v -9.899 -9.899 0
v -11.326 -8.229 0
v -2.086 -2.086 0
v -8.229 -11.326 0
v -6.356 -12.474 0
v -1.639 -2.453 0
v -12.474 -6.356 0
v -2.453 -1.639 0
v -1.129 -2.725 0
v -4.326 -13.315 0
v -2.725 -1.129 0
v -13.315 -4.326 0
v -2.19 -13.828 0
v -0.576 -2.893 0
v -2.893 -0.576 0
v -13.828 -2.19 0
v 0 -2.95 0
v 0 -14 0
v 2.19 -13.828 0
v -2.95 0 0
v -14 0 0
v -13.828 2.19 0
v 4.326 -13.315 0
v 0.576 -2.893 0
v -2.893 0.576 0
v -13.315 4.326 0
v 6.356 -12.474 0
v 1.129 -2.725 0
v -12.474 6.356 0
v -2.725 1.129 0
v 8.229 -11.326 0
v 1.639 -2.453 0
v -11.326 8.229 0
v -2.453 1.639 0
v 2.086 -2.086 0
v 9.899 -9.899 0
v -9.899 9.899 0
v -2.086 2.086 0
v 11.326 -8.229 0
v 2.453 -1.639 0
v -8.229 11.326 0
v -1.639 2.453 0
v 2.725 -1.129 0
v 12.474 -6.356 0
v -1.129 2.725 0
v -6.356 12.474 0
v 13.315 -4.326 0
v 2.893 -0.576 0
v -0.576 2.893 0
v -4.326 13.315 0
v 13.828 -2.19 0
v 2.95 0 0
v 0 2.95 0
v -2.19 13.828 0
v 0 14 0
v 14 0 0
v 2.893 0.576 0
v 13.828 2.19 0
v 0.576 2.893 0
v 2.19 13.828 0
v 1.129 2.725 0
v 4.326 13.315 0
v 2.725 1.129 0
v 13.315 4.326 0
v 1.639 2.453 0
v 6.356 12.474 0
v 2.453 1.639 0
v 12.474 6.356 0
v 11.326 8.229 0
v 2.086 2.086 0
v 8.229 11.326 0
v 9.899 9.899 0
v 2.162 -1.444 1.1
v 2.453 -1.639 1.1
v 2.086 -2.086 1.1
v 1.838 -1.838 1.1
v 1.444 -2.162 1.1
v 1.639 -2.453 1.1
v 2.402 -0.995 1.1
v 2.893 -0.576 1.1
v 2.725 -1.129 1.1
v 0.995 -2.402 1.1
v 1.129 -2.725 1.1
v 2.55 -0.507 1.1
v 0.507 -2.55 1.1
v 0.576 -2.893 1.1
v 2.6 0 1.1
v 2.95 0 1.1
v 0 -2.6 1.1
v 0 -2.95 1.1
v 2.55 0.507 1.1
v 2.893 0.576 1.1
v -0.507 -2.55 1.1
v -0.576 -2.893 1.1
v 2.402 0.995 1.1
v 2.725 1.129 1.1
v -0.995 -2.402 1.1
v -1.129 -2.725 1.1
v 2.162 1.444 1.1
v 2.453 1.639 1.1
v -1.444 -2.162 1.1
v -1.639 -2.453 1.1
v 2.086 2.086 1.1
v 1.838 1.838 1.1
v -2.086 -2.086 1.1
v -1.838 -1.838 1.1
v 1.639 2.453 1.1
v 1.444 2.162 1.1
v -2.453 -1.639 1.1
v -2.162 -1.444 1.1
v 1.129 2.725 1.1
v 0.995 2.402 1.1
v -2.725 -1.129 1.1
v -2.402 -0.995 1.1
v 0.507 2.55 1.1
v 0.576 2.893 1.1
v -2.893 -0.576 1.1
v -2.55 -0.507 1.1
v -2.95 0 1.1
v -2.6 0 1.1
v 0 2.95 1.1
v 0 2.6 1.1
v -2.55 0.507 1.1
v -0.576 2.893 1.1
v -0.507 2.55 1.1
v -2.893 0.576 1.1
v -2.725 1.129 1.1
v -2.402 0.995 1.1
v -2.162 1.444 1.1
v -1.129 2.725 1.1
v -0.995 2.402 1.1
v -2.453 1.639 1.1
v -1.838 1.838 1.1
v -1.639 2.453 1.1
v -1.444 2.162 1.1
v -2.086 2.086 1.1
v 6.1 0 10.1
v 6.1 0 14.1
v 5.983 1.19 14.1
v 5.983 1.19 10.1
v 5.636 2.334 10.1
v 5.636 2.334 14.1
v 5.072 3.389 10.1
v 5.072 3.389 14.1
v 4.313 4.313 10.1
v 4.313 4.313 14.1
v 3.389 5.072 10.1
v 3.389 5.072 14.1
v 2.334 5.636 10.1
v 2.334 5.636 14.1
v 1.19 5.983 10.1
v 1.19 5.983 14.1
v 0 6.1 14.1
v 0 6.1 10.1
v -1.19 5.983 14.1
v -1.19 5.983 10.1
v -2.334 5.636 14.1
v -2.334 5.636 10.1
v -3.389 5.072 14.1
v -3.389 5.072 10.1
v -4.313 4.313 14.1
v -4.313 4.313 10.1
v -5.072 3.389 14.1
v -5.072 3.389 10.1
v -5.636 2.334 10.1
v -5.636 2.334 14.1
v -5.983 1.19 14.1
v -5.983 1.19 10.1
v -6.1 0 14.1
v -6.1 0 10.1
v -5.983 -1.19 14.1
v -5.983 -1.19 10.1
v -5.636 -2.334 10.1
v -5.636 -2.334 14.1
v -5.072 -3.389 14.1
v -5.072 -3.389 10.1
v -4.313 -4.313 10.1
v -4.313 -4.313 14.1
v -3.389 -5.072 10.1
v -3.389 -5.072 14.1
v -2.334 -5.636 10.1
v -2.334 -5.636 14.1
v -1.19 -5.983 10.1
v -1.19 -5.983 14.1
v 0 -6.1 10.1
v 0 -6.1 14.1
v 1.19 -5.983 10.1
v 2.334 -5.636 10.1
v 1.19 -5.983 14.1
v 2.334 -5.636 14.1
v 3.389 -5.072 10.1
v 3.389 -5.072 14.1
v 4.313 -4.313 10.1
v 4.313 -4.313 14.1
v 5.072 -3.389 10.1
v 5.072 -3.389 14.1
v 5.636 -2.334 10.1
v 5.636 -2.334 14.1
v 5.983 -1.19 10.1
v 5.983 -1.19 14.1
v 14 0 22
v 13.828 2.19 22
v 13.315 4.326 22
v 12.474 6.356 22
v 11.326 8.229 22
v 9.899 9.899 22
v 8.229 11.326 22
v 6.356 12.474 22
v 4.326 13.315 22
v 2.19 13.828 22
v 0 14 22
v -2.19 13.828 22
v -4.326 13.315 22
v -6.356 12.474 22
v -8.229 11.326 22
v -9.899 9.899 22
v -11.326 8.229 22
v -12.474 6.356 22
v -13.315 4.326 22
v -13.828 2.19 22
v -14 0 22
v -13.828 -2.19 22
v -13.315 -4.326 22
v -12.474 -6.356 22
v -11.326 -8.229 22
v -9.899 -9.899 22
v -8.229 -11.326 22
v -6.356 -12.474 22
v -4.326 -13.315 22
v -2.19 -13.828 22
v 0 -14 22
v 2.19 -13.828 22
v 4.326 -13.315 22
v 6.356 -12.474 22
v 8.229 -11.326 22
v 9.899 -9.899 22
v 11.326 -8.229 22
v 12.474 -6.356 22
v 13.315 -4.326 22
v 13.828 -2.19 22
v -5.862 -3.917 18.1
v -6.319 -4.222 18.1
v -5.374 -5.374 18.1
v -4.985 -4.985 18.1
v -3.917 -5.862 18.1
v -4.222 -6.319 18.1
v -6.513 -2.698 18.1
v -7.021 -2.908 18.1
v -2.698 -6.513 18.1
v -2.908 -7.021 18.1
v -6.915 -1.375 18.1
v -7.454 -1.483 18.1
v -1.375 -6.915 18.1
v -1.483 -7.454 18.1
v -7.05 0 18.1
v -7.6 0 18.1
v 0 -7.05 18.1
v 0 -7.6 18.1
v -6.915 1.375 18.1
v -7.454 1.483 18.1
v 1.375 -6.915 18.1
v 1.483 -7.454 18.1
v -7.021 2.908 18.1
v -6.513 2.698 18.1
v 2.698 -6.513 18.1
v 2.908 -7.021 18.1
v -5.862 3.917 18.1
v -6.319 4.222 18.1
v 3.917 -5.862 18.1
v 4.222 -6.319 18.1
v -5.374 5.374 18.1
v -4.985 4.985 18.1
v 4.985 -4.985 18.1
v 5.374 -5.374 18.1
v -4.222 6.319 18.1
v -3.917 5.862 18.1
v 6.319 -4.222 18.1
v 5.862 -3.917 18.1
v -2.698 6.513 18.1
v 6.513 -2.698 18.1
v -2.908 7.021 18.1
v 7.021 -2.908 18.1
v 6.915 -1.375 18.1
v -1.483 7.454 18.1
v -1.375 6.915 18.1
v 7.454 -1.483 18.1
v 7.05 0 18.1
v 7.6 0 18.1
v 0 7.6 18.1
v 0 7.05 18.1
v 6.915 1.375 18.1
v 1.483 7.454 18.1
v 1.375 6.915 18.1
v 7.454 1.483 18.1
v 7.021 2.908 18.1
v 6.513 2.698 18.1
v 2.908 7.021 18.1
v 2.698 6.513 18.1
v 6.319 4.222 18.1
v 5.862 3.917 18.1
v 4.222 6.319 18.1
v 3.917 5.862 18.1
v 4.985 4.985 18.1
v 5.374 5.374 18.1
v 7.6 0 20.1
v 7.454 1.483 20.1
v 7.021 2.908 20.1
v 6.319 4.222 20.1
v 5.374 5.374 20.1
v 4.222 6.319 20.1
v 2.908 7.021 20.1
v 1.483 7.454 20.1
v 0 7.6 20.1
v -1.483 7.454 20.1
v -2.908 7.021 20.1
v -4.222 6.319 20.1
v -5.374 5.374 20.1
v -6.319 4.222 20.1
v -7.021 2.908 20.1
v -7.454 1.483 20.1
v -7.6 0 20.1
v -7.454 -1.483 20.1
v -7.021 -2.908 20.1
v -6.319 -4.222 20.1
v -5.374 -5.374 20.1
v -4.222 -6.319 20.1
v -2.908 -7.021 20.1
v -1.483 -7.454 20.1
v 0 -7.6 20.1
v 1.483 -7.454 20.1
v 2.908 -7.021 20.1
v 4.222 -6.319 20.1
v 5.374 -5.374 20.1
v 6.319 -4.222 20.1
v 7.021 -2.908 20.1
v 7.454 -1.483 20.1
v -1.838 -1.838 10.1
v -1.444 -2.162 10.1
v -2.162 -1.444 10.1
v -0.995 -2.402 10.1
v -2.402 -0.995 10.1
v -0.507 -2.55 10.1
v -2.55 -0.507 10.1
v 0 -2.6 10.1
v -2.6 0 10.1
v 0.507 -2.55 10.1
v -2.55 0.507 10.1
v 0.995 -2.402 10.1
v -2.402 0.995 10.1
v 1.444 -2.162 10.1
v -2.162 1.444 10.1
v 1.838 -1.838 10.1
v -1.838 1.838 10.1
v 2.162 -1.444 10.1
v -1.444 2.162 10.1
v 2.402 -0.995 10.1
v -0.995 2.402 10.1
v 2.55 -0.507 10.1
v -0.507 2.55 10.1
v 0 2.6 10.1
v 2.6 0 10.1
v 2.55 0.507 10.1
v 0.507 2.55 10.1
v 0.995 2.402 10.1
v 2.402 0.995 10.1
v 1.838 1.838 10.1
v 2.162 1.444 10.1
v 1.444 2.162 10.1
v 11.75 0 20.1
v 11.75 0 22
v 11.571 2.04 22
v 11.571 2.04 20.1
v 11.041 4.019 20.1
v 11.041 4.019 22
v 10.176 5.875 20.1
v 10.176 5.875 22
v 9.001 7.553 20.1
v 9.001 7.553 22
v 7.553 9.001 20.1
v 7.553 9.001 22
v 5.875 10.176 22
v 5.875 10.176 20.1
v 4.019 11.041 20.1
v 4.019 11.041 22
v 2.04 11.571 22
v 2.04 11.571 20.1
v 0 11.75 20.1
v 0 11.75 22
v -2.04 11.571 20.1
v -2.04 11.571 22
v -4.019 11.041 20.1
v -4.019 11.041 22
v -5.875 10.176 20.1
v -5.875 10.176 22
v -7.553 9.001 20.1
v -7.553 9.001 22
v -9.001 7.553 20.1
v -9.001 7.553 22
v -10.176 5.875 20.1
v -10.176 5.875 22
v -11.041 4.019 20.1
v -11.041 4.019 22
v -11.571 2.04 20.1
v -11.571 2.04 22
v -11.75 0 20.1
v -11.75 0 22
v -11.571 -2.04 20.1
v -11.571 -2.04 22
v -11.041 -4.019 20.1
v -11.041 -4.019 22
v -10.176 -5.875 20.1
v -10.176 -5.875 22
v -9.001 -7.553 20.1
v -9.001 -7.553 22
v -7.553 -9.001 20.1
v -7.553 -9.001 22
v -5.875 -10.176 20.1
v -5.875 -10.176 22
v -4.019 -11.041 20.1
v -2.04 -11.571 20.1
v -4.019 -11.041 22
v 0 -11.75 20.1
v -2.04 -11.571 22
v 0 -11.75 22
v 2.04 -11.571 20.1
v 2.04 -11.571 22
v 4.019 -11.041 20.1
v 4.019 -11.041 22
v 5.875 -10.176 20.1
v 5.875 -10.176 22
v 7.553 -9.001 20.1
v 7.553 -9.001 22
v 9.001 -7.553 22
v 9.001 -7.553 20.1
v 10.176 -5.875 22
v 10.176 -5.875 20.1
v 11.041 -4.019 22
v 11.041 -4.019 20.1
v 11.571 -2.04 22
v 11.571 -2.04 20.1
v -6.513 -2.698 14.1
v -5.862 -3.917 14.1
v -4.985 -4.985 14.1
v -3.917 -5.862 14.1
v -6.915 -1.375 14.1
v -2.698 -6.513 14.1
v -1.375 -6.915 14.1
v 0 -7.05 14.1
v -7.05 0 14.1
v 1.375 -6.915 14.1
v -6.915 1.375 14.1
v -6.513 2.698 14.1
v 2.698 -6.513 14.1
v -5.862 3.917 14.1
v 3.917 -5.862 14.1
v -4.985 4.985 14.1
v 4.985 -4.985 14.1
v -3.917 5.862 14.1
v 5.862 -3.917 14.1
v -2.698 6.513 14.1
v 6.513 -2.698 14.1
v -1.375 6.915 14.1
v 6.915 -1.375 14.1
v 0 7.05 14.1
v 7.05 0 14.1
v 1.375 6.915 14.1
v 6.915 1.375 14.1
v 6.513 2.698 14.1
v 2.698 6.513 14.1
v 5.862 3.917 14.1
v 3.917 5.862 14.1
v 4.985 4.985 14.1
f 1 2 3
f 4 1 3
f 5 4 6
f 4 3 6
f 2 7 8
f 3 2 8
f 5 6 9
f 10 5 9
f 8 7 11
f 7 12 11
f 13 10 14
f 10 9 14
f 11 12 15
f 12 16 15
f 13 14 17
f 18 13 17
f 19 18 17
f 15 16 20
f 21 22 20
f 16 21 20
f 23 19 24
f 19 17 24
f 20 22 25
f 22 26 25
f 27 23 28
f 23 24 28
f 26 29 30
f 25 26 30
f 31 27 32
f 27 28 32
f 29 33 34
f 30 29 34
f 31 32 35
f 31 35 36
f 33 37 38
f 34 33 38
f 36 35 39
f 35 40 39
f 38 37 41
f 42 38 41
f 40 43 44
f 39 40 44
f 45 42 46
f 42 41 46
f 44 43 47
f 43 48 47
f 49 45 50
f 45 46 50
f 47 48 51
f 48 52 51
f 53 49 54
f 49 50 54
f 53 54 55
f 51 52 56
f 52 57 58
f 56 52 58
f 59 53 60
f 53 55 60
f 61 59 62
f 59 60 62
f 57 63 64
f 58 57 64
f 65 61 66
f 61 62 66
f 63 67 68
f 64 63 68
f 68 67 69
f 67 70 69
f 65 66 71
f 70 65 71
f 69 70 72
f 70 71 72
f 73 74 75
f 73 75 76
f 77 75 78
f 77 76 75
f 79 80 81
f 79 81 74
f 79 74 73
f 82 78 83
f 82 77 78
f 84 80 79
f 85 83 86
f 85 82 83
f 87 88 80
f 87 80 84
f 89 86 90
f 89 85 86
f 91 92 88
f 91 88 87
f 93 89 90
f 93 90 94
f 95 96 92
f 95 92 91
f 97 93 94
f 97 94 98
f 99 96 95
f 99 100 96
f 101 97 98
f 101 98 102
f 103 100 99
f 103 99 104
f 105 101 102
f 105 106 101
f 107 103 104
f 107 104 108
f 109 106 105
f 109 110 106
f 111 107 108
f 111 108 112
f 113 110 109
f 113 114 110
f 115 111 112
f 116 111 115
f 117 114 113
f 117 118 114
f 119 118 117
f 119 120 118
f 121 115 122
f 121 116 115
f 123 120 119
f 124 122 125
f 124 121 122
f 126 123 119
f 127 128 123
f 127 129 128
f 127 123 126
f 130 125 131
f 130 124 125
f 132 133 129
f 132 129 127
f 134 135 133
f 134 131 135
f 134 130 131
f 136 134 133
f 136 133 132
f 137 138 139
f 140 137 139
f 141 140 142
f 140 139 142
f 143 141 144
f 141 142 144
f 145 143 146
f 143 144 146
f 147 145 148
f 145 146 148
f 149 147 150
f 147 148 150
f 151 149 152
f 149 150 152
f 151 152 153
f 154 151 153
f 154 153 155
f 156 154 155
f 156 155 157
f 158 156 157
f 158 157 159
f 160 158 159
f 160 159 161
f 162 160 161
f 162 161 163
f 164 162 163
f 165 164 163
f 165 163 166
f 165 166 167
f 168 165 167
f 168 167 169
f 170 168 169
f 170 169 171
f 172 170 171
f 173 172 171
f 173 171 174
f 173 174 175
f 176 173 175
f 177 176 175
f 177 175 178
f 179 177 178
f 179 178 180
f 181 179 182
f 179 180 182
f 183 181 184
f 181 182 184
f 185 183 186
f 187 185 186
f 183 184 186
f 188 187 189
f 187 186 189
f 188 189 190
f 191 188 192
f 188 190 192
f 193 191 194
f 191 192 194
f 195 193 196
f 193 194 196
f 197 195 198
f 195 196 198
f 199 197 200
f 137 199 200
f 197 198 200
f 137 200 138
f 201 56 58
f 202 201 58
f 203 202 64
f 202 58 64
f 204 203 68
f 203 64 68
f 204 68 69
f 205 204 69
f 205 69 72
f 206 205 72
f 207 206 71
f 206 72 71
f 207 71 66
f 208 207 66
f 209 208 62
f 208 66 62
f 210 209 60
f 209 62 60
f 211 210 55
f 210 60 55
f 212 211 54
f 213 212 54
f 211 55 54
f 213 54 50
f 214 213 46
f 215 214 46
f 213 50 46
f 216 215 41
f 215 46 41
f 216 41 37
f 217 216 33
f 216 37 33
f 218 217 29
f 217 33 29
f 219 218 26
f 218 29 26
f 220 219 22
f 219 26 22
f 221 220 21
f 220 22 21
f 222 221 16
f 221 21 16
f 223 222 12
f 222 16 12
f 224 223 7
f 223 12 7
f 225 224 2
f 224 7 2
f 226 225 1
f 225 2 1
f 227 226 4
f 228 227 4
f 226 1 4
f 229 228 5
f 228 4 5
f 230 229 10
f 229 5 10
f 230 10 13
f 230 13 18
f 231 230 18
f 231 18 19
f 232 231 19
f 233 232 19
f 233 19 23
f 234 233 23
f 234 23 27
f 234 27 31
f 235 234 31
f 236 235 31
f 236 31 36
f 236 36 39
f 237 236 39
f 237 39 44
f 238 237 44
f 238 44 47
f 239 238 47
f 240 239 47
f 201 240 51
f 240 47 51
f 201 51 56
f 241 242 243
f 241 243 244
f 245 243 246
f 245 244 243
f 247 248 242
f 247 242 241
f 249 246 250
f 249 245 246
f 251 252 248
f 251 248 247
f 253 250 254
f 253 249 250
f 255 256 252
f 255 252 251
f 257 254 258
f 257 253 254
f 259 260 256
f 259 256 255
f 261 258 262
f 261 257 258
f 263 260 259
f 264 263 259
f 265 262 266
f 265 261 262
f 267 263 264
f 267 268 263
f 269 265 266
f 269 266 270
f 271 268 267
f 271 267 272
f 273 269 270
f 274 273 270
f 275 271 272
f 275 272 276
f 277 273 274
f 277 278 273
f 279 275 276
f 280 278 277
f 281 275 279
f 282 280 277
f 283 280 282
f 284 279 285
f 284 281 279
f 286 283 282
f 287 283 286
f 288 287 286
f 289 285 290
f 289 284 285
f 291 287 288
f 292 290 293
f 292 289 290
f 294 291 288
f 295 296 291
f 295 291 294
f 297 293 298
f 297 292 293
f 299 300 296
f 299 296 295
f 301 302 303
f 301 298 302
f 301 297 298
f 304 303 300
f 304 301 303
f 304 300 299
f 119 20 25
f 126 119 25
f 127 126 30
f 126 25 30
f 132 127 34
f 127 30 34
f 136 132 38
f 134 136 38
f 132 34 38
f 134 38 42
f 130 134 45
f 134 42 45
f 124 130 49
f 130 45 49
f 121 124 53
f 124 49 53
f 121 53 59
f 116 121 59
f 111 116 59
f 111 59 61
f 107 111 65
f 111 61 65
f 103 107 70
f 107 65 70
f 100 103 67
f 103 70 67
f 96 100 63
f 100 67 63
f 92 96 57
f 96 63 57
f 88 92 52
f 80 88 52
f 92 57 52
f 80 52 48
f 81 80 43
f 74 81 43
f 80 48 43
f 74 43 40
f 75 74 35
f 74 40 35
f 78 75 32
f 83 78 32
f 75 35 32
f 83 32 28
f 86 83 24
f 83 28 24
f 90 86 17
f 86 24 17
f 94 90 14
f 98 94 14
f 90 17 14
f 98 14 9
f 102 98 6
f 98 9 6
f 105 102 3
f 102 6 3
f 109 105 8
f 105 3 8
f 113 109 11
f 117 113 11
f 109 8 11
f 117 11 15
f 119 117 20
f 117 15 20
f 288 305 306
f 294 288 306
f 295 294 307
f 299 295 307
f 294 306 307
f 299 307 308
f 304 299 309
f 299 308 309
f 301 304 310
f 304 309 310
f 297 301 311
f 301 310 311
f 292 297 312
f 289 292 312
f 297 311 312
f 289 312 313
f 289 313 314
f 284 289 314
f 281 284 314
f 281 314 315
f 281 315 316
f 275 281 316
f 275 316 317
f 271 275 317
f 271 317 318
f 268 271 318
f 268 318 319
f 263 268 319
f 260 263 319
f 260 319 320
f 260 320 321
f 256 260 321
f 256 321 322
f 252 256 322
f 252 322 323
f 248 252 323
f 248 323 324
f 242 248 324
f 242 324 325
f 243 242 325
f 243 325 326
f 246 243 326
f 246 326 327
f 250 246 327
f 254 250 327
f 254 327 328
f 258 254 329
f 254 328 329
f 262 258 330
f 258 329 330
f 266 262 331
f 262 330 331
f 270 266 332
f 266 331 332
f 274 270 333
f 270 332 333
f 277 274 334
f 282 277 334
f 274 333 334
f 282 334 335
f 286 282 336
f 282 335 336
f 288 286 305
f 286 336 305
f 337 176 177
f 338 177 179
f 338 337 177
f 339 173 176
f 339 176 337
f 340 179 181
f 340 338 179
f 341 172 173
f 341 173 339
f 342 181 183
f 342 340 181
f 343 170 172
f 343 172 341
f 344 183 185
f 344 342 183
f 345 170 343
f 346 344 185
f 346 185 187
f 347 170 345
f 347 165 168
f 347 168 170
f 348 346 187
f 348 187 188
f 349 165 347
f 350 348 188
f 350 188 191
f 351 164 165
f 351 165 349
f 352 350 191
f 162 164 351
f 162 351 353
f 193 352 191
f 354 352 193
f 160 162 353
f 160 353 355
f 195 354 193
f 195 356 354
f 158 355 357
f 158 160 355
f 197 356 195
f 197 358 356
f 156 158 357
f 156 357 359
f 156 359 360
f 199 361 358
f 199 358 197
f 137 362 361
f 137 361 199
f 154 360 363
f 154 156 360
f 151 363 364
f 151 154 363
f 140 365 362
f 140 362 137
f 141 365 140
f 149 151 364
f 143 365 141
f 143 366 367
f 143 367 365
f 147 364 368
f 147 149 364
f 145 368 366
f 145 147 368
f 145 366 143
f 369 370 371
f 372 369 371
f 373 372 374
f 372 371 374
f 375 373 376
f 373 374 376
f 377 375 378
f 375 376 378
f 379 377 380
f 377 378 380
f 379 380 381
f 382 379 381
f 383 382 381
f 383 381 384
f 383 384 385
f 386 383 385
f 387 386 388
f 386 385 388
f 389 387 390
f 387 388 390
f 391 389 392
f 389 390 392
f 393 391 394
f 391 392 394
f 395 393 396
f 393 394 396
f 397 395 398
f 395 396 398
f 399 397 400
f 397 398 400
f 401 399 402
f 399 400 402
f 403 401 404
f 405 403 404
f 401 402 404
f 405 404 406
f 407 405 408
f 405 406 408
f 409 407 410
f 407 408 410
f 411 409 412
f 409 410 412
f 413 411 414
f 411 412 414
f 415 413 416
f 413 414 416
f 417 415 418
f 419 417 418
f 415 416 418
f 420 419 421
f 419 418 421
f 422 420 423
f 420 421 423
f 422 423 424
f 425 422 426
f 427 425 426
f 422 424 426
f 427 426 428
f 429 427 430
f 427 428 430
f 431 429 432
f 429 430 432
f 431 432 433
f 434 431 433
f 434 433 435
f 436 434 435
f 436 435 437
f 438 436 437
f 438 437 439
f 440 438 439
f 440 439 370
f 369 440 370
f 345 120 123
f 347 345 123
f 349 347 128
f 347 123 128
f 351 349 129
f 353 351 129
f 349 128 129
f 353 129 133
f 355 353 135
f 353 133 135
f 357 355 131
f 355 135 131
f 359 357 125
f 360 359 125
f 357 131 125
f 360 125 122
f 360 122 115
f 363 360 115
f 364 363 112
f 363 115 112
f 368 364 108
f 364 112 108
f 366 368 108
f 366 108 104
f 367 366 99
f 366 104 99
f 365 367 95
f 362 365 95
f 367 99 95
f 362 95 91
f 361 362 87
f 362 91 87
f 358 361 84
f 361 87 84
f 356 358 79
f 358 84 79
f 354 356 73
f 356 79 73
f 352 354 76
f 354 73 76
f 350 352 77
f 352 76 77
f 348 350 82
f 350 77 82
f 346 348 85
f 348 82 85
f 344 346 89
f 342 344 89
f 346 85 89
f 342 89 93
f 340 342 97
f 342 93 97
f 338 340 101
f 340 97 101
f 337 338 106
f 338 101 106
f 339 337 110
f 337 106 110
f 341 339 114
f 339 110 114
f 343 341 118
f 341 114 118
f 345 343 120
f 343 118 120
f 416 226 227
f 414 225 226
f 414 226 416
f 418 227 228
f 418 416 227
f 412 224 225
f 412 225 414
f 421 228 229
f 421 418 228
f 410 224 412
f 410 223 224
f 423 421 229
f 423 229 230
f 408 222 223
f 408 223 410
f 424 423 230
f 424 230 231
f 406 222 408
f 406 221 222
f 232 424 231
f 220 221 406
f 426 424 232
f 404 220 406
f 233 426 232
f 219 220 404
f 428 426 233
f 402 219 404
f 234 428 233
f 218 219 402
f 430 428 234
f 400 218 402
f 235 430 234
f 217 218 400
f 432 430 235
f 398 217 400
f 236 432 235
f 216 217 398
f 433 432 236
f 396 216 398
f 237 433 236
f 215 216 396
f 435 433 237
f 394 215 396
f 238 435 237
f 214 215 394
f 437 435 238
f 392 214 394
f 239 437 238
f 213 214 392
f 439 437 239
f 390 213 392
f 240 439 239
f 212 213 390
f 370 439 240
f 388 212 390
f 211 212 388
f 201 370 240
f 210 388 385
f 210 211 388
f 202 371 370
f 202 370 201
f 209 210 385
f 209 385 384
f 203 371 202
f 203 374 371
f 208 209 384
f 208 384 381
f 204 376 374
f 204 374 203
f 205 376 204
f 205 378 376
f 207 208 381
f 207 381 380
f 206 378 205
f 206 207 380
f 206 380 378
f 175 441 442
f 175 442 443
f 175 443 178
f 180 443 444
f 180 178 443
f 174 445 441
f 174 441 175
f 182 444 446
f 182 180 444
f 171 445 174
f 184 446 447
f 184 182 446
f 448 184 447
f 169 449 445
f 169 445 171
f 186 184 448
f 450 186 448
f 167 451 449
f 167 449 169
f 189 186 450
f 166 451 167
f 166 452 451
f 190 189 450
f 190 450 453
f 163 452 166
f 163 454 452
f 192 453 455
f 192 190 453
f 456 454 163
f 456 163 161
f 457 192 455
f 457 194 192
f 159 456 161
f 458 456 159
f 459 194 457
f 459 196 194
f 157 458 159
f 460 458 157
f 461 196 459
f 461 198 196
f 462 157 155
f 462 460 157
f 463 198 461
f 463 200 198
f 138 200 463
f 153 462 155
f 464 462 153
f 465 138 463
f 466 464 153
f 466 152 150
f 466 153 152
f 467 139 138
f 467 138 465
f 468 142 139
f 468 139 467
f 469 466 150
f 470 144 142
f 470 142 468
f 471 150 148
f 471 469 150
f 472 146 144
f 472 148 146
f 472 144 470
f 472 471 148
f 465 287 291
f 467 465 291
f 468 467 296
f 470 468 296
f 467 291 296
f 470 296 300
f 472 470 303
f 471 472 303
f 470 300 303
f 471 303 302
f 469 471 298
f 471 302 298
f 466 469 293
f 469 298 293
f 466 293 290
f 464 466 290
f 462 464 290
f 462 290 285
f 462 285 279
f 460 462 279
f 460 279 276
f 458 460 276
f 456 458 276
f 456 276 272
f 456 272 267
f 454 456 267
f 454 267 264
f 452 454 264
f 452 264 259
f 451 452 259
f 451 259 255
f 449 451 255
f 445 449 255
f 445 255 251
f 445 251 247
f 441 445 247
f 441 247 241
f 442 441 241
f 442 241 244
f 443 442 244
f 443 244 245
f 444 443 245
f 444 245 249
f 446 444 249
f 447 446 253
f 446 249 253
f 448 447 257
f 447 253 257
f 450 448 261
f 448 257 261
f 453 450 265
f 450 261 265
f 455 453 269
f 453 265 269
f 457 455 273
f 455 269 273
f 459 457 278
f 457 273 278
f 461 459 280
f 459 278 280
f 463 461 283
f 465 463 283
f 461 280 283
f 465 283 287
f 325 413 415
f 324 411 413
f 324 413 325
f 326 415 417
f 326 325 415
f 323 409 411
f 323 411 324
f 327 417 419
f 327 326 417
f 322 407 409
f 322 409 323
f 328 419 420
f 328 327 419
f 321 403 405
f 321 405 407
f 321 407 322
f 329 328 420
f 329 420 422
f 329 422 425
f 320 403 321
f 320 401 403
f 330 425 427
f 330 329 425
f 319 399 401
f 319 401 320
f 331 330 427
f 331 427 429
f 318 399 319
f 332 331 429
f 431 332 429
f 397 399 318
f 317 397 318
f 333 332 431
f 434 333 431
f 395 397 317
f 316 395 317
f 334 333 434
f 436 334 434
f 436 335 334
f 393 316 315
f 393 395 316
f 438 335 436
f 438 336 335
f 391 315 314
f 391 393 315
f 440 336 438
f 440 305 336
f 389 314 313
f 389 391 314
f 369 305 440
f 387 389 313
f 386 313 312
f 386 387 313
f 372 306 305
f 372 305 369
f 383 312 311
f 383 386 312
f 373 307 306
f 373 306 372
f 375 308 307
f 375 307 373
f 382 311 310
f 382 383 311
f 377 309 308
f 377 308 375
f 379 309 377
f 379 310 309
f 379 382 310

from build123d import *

# Parameters (mm, degrees)
SKETCH_1_R          = 14
EXTRUDE_1_DEPTH     = 22
SKETCH_2_R          = 2.95
CUT_EXTRUDE_1_DEPTH = 1.1
SKETCH_3_R          = 2.6
CUT_EXTRUDE_2_DEPTH = 9
SKETCH_5_R          = 6.1
CUT_EXTRUDE_3_DEPTH = 11.9
SKETCH_6_R          = 7.05
CUT_EXTRUDE_4_DEPTH = 7.9
SKETCH_7_R          = 7.6
CUT_EXTRUDE_5_DEPTH = 3.9
SKETCH_8_R          = 11.75
CUT_EXTRUDE_6_DEPTH = 1.9


with BuildPart() as part:
    # Эскиз1 → Бобышка-Вытянуть1 (new body)
    with BuildSketch(Plane.XY):
        Circle(SKETCH_1_R)
    extrude(amount=EXTRUDE_1_DEPTH)

    # Эскиз2 → Вырез-Вытянуть1 (cut)
    with BuildSketch(Plane(origin=(0, 0, 0), x_dir=(-1, 0, 0), z_dir=(0, 0, -1))):
        Circle(SKETCH_2_R)
    extrude(amount=-CUT_EXTRUDE_1_DEPTH, mode=Mode.SUBTRACT)

    # Эскиз3 → Вырез-Вытянуть2 (cut)
    with BuildSketch(Plane(origin=(0, 0, 1.1), x_dir=(-1, 0, 0), z_dir=(0, 0, -1))):
        Circle(SKETCH_3_R)
    extrude(amount=-CUT_EXTRUDE_2_DEPTH, mode=Mode.SUBTRACT)

    # Эскиз5 → Вырез-Вытянуть3 (cut)
    with BuildSketch(Plane.XY.offset(22)):
        Circle(SKETCH_5_R)
    extrude(amount=-CUT_EXTRUDE_3_DEPTH, mode=Mode.SUBTRACT)

    # Эскиз6 → Вырез-Вытянуть4 (cut)
    with BuildSketch(Plane.XY.offset(22)):
        Circle(SKETCH_6_R)
    extrude(amount=-CUT_EXTRUDE_4_DEPTH, mode=Mode.SUBTRACT)

    # Эскиз7 → Вырез-Вытянуть5 (cut)
    with BuildSketch(Plane.XY.offset(22)):
        Circle(SKETCH_7_R)
    extrude(amount=-CUT_EXTRUDE_5_DEPTH, mode=Mode.SUBTRACT)

    # Эскиз8 → Вырез-Вытянуть6 (cut)
    with BuildSketch(Plane.XY.offset(22)):
        Circle(SKETCH_8_R)
    extrude(amount=-CUT_EXTRUDE_6_DEPTH, mode=Mode.SUBTRACT)


solid = part.part
